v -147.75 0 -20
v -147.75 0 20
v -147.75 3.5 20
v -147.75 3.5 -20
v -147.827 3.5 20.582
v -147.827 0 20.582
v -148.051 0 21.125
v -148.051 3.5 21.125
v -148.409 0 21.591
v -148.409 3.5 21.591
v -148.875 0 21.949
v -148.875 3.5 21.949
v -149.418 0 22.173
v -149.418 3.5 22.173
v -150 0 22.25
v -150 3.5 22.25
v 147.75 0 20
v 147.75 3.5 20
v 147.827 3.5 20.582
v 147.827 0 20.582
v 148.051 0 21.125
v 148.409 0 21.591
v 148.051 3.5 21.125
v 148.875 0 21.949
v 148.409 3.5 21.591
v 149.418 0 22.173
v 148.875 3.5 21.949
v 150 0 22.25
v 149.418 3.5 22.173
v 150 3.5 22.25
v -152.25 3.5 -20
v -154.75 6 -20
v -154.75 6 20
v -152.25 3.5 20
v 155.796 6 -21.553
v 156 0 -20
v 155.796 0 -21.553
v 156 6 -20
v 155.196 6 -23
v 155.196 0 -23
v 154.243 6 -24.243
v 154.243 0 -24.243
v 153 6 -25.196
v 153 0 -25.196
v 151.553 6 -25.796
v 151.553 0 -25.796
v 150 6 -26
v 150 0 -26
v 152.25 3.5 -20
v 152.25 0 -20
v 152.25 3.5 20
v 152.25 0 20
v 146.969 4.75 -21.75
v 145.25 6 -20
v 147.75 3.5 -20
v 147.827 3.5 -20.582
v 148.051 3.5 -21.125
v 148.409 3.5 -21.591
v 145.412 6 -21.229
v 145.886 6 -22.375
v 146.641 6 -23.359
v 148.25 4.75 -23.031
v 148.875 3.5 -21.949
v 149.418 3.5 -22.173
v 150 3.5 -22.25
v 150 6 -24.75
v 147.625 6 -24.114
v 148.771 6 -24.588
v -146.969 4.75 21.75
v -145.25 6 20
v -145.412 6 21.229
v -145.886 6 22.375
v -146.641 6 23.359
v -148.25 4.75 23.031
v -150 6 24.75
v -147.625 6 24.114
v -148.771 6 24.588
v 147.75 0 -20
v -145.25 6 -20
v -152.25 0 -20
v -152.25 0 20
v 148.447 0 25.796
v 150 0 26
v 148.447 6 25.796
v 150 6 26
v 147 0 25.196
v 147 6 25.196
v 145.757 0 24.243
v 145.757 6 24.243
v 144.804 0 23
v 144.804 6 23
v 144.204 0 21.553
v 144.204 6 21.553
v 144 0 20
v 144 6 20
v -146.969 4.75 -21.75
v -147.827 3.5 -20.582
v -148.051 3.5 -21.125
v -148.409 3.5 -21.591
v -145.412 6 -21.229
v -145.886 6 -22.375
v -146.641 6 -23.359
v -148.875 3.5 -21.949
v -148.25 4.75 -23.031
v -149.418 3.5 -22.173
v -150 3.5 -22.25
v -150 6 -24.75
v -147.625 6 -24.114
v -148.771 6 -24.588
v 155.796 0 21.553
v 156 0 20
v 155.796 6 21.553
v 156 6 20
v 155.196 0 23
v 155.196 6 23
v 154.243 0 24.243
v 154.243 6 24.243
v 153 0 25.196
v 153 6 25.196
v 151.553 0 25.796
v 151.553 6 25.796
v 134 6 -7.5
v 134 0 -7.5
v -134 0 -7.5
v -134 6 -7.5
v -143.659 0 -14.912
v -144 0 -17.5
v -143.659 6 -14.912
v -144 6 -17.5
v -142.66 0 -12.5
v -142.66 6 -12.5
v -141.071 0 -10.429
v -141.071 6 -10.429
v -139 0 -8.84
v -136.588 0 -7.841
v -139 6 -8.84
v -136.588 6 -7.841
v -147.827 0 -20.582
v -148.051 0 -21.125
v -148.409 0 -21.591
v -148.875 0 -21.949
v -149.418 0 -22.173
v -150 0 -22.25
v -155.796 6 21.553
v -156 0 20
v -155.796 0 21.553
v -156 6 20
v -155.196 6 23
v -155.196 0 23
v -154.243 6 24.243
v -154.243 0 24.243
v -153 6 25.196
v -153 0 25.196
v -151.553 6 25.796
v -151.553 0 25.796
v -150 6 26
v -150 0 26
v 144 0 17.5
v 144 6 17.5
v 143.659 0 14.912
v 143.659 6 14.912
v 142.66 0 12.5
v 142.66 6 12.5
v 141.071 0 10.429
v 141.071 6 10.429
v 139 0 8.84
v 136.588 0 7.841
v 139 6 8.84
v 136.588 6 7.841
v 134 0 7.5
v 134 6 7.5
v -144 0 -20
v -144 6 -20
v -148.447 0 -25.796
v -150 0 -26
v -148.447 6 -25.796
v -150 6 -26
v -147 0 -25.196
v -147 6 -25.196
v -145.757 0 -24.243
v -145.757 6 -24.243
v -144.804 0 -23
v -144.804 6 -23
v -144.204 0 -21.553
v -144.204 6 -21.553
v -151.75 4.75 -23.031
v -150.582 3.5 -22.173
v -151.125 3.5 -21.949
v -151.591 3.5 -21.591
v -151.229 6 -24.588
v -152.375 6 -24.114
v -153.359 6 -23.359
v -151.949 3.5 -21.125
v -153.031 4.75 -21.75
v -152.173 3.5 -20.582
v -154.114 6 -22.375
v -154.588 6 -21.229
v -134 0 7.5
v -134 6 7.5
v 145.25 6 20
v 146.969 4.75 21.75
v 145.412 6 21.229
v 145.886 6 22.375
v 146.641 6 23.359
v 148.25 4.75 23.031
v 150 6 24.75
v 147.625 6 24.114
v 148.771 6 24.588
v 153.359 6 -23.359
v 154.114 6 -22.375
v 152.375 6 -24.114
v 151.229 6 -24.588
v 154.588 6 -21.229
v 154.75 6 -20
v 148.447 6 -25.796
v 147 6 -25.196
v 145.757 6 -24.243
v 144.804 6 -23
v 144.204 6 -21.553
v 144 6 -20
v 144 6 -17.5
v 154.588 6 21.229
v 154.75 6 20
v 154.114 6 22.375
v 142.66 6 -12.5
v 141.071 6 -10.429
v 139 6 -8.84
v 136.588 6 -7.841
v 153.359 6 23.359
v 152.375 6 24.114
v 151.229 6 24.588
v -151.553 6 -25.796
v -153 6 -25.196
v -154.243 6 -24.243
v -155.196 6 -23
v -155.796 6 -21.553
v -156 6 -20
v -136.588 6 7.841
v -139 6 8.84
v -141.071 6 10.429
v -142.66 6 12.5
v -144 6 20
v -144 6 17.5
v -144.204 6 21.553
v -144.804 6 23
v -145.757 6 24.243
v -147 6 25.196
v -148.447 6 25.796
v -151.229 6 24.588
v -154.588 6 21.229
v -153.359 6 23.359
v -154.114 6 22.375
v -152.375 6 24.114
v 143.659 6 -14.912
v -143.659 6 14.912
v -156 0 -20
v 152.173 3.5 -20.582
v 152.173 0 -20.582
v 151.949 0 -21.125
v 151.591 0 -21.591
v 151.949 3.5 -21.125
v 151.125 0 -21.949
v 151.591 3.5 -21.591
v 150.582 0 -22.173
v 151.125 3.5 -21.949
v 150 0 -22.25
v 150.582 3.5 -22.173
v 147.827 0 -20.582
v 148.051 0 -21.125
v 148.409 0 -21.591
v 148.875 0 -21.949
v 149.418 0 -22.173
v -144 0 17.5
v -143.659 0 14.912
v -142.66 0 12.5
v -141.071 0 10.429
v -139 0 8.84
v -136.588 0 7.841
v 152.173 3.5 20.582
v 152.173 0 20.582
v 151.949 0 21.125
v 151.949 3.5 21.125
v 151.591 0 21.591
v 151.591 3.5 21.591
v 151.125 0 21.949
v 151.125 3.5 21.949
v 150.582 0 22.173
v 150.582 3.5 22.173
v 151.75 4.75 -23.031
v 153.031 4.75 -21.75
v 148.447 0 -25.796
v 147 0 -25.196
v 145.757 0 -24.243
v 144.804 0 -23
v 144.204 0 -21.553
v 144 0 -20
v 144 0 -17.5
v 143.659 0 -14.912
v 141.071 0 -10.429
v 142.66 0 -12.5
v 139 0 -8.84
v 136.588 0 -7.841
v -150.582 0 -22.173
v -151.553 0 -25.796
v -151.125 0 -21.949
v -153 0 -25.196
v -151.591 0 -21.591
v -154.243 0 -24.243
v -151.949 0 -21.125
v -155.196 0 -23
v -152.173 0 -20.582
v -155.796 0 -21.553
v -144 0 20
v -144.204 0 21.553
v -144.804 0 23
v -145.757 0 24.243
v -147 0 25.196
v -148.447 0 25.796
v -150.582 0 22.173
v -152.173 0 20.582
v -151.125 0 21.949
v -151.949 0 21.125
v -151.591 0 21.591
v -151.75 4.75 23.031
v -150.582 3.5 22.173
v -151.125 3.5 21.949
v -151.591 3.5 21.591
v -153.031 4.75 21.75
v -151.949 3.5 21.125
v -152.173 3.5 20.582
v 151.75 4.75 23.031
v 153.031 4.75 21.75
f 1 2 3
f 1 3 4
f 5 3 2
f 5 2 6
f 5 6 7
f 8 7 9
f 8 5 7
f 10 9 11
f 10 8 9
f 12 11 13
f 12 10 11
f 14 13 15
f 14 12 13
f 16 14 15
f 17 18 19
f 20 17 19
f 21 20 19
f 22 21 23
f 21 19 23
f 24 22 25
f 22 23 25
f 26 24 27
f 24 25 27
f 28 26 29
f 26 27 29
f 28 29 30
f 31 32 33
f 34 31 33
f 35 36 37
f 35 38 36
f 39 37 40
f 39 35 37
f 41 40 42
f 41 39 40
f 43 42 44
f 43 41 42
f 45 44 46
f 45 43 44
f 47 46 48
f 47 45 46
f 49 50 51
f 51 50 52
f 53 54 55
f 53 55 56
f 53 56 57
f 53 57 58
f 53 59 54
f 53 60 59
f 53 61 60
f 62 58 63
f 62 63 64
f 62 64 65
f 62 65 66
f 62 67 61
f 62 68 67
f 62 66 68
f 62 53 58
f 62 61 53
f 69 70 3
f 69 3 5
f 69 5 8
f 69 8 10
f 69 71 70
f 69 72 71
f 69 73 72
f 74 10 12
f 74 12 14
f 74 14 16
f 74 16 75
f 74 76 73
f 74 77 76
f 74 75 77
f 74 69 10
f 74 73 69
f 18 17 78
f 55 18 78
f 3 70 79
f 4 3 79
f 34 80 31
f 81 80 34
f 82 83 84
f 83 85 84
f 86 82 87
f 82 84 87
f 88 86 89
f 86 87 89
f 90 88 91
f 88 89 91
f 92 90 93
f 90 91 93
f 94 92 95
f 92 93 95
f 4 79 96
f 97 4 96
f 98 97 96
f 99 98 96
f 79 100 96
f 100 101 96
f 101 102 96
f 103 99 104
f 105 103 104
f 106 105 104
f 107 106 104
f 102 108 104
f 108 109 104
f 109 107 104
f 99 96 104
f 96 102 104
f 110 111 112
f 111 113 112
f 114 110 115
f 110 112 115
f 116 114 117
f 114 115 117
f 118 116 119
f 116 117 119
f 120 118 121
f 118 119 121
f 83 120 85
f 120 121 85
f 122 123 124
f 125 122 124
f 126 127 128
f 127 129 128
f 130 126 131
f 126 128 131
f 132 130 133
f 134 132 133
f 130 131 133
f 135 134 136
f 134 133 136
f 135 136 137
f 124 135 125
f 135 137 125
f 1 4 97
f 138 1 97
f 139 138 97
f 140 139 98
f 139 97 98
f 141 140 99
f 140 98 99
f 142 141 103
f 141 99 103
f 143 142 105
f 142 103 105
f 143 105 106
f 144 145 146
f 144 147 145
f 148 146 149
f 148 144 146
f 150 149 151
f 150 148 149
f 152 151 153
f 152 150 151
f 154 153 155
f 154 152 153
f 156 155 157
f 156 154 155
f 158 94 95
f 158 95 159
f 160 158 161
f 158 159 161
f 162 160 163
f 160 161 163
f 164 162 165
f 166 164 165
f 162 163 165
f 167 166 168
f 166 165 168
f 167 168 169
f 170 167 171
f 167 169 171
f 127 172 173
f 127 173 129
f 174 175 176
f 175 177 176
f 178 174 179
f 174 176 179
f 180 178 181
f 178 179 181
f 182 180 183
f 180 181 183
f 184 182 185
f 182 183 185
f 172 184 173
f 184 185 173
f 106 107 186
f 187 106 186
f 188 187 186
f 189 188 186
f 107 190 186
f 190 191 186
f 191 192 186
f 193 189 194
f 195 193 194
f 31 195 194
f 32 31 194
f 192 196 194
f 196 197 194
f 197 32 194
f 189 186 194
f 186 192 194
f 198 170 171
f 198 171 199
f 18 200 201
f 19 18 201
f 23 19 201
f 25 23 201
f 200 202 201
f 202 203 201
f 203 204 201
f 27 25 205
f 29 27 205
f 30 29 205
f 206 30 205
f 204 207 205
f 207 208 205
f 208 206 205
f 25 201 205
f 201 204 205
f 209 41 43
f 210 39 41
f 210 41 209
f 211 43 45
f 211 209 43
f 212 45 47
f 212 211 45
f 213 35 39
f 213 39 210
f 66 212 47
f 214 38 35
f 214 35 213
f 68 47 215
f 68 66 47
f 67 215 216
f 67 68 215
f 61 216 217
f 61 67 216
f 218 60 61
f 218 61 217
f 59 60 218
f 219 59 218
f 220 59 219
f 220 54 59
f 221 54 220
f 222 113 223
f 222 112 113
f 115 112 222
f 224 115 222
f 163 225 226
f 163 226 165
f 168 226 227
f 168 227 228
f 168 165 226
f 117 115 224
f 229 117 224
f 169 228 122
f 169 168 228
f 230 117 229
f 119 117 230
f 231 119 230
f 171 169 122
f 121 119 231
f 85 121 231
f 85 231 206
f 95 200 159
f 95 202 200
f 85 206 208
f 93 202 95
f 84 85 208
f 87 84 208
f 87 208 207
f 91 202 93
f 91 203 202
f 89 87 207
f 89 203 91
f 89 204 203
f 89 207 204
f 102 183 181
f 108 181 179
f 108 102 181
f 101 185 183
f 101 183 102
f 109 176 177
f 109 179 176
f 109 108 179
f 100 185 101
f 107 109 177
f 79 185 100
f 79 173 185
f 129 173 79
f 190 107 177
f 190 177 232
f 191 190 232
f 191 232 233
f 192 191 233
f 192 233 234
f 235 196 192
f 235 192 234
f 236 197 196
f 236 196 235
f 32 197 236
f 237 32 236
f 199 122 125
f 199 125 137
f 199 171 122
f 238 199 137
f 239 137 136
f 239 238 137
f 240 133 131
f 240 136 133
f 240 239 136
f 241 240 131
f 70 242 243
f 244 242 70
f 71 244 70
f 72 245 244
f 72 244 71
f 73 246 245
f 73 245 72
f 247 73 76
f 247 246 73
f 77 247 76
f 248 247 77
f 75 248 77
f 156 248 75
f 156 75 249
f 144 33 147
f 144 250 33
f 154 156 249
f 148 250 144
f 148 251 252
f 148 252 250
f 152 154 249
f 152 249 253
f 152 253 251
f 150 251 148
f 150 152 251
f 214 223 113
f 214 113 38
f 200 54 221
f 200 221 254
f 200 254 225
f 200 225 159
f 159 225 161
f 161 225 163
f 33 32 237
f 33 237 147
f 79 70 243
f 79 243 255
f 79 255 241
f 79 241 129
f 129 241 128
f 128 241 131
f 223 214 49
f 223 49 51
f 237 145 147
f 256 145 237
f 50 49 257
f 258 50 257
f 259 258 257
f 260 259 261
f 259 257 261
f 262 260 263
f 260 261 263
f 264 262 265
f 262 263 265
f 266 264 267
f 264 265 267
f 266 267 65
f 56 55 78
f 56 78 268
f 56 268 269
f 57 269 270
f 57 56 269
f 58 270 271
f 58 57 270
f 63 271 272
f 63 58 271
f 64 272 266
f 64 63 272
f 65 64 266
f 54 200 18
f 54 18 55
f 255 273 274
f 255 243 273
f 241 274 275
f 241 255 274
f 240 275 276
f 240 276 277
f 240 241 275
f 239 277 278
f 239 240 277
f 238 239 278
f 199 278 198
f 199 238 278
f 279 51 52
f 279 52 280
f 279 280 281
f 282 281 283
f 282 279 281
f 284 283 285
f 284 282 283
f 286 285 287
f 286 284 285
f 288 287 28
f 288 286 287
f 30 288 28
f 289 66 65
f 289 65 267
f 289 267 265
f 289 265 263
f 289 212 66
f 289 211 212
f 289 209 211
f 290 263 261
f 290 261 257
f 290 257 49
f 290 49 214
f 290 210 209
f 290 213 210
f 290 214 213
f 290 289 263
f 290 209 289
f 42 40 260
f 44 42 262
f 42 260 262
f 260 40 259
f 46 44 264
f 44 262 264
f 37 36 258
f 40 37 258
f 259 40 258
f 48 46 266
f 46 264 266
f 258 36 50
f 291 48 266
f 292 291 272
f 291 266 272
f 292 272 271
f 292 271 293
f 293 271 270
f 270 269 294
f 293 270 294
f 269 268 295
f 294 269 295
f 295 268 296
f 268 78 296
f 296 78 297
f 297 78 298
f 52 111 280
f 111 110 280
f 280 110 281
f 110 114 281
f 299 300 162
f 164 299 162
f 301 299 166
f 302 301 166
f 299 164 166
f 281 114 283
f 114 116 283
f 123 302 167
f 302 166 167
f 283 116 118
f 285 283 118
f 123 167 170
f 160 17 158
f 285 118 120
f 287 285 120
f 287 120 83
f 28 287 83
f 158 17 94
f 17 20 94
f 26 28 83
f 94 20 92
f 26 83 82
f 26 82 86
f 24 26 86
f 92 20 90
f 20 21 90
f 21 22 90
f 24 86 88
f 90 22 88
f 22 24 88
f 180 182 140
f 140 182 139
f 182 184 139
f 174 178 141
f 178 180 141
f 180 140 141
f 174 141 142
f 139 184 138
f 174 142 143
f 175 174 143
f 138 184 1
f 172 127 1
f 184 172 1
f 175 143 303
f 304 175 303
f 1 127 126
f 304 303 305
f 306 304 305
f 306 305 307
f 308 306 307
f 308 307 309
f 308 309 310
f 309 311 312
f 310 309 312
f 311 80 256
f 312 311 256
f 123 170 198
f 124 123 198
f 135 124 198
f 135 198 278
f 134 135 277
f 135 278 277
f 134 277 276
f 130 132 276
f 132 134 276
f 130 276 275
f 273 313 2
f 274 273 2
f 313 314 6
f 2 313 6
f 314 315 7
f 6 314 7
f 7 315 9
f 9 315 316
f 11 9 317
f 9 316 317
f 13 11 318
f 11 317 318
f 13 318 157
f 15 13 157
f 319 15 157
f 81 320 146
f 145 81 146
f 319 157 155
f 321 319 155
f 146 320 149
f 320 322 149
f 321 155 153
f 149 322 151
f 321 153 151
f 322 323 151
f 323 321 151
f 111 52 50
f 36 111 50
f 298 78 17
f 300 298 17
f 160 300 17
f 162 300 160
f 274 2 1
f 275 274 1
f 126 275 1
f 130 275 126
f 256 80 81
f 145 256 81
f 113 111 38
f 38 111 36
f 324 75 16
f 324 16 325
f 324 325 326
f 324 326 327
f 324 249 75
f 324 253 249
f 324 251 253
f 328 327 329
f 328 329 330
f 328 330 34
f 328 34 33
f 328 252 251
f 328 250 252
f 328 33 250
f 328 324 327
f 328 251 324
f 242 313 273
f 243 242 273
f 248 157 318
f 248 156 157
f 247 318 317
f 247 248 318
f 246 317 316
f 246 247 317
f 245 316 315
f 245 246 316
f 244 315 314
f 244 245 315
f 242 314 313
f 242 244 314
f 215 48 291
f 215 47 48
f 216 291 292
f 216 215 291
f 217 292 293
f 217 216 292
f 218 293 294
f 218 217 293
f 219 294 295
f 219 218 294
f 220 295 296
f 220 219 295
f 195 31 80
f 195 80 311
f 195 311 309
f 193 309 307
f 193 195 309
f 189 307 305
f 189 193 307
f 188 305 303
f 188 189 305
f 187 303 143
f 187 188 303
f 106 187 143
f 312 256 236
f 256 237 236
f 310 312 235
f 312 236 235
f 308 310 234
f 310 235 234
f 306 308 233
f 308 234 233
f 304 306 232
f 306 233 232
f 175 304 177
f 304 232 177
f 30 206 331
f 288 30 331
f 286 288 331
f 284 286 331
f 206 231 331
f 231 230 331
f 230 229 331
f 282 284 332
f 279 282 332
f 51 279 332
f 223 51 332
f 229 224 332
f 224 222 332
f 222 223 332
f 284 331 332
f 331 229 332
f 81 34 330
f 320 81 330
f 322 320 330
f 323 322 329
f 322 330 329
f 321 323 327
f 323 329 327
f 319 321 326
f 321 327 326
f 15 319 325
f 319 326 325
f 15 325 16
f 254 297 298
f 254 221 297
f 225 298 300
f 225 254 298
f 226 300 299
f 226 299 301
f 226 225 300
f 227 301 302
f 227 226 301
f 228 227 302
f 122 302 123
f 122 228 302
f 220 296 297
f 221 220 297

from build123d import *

# Parameters (mm, degrees)
BOSS_EXTRUDE1_DEPTH = 6
FILLET1_R           = 10
FILLET2_R           = 2.25
FILLET3_R           = 6
CHAMFER1_SIZE       = 2.5


with BuildPart() as part:
    # Sketch1 → Boss-Extrude1 (new body)
    with BuildSketch(Plane(origin=(0, 0, 0), x_dir=(1, 0, 0), z_dir=(0, 1, 0))):
        Polygon((-152.25, 0), (-156, 0), (-156, -26), (-144, -26), (-144, -7.5), (0, -7.5), (0, 0), (-85.684931507, 0), (-147.75, 0), (-147.75, -22.25), (-152.25, -22.25), align=None)
    extrude(amount=BOSS_EXTRUDE1_DEPTH)

    # Fillet1
    fillet1_edges = [part.edges().sort_by_distance(p)[0] for p in [
        (-144, 3, 7.5),
    ]]
    fillet(fillet1_edges, radius=FILLET1_R)

    # Fillet2
    fillet2_edges = [part.edges().sort_by_distance(p)[0] for p in [
        (-152.25, 3, 22.25),
        (-147.75, 3, 22.25),
    ]]
    fillet(fillet2_edges, radius=FILLET2_R - 0.0001)  # a hair under: the kernel refuses the full size

    # Fillet3
    fillet3_edges = [part.edges().sort_by_distance(p)[0] for p in [
        (-156, 3, 26),
        (-144, 3, 26),
    ]]
    fillet(fillet3_edges, radius=FILLET3_R - 0.0001)  # a hair under: the kernel refuses the full size

    # Chamfer1
    chamfer1_edges = [part.edges().sort_by_distance(p)[0] for p in [
        (-152.25, 6, 10.00005),
        (-147.75, 6, 10.00005),
        (-151.591019547, 6, 21.591019547),
        (-148.408980453, 6, 21.591019547),
    ]]
    chamfer(chamfer1_edges, length=CHAMFER1_SIZE)

    # Mirror1: part across plane


with BuildPart() as part_1:
    add(part.part)
    add(part.part.mirror(Plane(origin=(0, 6, 0), x_dir=(1, 0, 0), z_dir=(0, 0, 1))))

    # Mirror2: part across plane


with BuildPart() as part_2:
    add(part_1.part)
    add(part_1.part.mirror(Plane(origin=(0, 6, 0), x_dir=(0, 0, 1), z_dir=(1, 0, 0))))


solid = part_2.part
